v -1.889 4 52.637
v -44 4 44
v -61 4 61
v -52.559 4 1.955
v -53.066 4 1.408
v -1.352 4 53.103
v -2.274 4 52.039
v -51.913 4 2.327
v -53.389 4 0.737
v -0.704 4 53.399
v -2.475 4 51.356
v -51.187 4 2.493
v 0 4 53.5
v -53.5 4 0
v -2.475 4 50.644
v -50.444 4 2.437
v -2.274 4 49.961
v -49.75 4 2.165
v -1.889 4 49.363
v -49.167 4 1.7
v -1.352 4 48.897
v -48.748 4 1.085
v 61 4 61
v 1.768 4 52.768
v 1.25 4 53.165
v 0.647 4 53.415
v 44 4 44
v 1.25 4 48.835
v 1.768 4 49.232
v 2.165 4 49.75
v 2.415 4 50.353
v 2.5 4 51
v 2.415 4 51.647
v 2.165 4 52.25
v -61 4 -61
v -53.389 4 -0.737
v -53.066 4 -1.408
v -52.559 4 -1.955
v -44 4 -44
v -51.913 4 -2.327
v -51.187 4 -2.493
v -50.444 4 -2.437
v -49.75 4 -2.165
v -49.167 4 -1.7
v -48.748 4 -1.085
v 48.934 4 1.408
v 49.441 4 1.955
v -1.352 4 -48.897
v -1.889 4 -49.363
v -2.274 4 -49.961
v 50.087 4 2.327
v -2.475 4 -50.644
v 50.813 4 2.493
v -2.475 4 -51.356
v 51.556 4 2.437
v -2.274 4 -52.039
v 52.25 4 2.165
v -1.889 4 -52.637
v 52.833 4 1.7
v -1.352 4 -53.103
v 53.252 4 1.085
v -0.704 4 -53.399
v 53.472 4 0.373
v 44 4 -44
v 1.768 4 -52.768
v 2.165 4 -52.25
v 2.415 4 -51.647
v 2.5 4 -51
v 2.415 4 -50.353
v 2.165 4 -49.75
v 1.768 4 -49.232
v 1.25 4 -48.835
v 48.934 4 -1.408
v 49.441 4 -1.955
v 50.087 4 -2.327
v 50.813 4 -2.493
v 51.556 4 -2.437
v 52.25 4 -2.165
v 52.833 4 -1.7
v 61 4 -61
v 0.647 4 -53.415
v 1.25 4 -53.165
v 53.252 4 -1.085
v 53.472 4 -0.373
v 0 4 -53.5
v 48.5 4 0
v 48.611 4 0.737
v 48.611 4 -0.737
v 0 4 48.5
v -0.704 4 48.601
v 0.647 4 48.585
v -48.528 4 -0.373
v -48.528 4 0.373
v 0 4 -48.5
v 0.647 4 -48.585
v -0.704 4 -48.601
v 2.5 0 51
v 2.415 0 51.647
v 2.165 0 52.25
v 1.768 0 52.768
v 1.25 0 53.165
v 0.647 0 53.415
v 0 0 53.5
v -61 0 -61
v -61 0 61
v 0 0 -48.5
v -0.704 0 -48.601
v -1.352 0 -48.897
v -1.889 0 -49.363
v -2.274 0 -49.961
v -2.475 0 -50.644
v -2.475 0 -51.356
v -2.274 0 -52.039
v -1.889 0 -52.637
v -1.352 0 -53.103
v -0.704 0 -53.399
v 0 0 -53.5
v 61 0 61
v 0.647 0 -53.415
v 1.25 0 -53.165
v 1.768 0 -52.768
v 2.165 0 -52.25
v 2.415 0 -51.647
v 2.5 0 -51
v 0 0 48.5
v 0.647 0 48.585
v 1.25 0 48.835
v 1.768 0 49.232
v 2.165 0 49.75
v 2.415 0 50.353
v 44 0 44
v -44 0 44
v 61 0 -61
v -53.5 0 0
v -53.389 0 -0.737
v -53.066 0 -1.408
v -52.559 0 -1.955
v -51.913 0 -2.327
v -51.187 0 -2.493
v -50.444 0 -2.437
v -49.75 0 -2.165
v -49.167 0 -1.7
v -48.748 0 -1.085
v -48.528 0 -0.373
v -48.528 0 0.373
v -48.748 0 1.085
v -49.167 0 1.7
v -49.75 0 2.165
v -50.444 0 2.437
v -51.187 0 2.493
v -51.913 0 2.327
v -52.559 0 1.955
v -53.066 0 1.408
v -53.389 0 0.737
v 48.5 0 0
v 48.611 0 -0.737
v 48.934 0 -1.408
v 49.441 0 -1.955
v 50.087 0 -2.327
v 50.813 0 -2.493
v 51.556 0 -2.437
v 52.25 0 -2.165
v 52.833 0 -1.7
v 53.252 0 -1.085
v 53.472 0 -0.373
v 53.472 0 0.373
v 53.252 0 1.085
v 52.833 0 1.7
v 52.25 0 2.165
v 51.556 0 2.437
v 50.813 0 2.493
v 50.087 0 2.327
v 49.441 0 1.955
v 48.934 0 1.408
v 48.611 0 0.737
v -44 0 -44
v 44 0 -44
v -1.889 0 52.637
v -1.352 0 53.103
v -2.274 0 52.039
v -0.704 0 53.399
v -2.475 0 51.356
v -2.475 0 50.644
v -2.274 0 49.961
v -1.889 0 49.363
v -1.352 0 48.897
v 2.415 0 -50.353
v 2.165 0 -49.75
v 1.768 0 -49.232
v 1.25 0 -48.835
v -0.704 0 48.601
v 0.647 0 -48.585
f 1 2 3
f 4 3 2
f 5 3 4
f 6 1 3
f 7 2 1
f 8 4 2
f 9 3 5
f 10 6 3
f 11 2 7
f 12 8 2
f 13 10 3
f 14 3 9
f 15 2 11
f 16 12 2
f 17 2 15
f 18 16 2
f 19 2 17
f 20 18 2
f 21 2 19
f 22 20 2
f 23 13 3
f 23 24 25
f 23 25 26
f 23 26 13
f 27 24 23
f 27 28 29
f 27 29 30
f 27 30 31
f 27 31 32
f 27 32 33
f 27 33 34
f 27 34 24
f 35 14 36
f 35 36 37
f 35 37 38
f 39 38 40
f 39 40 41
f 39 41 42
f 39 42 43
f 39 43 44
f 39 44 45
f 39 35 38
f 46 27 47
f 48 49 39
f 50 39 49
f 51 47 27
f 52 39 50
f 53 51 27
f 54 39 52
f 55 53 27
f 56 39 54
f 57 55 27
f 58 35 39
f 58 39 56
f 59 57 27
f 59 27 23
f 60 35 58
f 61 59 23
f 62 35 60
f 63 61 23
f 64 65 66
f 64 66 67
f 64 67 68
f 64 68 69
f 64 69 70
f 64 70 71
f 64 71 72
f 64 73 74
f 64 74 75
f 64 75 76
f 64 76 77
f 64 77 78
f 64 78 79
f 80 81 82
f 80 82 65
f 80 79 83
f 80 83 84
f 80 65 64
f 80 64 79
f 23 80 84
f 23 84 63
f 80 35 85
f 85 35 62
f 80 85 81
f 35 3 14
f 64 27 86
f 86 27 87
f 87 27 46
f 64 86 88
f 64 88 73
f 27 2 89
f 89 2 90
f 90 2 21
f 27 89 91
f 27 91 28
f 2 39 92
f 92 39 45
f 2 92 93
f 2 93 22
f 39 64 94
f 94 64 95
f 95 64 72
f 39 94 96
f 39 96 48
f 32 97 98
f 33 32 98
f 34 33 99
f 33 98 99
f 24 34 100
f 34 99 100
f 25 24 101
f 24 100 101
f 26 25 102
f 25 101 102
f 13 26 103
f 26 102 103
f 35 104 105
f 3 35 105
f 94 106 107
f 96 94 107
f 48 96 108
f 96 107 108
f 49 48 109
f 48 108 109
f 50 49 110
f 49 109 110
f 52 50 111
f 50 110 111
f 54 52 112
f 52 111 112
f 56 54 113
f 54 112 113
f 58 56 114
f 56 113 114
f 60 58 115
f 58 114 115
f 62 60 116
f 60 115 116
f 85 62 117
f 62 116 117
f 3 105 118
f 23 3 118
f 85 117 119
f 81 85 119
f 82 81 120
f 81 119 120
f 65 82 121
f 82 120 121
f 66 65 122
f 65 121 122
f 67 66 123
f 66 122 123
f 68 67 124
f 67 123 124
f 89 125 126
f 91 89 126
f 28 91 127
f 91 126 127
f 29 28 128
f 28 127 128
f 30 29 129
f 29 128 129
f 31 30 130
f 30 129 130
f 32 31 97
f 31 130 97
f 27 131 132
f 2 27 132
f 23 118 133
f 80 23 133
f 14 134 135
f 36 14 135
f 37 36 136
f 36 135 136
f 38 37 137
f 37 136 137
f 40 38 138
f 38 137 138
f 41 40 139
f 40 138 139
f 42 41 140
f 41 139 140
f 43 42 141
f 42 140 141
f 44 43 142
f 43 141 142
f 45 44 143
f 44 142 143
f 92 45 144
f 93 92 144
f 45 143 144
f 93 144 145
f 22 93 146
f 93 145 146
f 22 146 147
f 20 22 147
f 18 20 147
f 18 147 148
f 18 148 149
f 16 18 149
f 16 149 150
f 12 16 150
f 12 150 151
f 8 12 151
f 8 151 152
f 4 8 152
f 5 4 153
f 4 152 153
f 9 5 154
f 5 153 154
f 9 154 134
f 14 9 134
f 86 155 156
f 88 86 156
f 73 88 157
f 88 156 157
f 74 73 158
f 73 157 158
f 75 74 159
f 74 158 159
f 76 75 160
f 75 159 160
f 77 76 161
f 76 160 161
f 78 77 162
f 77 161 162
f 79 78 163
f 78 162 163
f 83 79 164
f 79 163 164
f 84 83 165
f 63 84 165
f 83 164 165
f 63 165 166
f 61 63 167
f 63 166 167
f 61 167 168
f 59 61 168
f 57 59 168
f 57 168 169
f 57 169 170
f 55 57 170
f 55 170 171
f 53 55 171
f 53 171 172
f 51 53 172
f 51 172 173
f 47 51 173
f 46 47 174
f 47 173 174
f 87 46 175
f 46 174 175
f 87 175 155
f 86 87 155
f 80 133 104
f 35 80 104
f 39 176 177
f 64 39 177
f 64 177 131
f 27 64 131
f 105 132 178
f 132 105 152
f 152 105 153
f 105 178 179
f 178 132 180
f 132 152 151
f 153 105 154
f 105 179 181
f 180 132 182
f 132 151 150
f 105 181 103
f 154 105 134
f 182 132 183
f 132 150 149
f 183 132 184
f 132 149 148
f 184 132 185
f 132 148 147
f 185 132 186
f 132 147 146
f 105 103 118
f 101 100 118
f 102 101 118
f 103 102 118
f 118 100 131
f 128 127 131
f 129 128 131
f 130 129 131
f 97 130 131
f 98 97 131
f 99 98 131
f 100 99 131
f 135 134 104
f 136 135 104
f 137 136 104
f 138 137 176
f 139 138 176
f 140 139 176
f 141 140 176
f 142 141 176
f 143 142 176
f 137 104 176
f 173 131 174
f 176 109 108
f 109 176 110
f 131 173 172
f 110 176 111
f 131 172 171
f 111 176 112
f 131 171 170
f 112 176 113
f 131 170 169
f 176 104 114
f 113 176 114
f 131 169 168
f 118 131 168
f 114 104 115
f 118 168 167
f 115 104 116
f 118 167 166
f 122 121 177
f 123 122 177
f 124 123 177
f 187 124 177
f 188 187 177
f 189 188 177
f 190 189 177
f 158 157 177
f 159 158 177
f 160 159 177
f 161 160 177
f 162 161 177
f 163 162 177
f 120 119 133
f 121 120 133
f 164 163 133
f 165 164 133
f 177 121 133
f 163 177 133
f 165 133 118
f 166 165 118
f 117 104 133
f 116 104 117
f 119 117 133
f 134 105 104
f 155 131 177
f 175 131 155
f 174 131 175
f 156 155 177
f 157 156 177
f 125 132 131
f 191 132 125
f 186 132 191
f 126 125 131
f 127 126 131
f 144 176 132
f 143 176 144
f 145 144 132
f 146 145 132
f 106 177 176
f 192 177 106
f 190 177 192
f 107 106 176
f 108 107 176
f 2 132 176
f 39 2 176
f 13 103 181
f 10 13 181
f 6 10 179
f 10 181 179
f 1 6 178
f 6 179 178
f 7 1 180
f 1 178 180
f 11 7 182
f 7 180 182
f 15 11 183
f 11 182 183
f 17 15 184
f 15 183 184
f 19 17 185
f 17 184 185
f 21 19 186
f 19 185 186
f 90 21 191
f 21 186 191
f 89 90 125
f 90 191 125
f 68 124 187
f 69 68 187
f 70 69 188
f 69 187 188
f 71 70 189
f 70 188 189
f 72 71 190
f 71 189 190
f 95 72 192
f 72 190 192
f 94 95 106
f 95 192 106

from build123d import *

# Parameters (mm, degrees)
BOSS_EXTRUDE1_DEPTH = 4


with BuildPart() as part:
    # Sketch1 → Boss-Extrude1 (new body)
    with BuildSketch(Plane(origin=(0, 0, 0), x_dir=(1, 0, 0), z_dir=(0, 1, 0))):
        with BuildLine():
            Line((-61, -61), (0, -61))
            Line((0, -61), (0, -53.5))
            ThreePointArc((0, -53.5), (-2.5, -51), (0, -48.5))
            Line((0, -48.5), (0, -44))
            Line((0, -44), (-44, -44))
            Line((-44, -44), (-44, 0))
            Line((-44, 0), (-48.5, 0))
            ThreePointArc((-48.5, 0), (-51, -2.5), (-53.5, 0))
            Line((-53.5, 0), (-61, 0))
            Line((-61, 0), (-61, -61))
        make_face()
        with BuildLine():
            Line((61, 0), (53.5, 0))
            ThreePointArc((53.5, 0), (51, -2.5), (48.5, 0))
            Line((48.5, 0), (44, 0))
            Line((44, 0), (44, -44))
            Line((44, -44), (0, -44))
            Line((0, -44), (0, -48.5))
            ThreePointArc((0, -48.5), (1.767766953, -49.232233047), (2.5, -51))
            ThreePointArc((2.5, -51), (1.767766953, -52.767766953), (0, -53.5))
            Line((0, -53.5), (0, -61))
            Line((0, -61), (61, -61))
            Line((61, -61), (61, 0))
        make_face()
        with BuildLine():
            ThreePointArc((48.5, 0), (51, 2.5), (53.5, 0))
            Line((53.5, 0), (61, 0))
            Line((61, 0), (61, 61))
            Line((61, 61), (0, 61))
            Line((0, 61), (0, 53.5))
            ThreePointArc((0, 53.5), (1.767766953, 52.767766953), (2.5, 51))
            ThreePointArc((2.5, 51), (1.767766953, 49.232233047), (0, 48.5))
            Line((0, 48.5), (0, 44))
            Line((0, 44), (44, 44))
            Line((44, 44), (44, 0))
            Line((44, 0), (48.5, 0))
        make_face()
        with BuildLine():
            Line((0, 53.5), (0, 61))
            Line((0, 61), (-61, 61))
            Line((-61, 61), (-61, 0))
            Line((-61, 0), (-53.5, 0))
            ThreePointArc((-53.5, 0), (-51, 2.5), (-48.5, 0))
            Line((-48.5, 0), (-44, 0))
            Line((-44, 0), (-44, 44))
            Line((-44, 44), (0, 44))
            Line((0, 44), (0, 48.5))
            ThreePointArc((0, 48.5), (-2.5, 51), (0, 53.5))
        make_face()
    extrude(amount=BOSS_EXTRUDE1_DEPTH)


solid = part.part
